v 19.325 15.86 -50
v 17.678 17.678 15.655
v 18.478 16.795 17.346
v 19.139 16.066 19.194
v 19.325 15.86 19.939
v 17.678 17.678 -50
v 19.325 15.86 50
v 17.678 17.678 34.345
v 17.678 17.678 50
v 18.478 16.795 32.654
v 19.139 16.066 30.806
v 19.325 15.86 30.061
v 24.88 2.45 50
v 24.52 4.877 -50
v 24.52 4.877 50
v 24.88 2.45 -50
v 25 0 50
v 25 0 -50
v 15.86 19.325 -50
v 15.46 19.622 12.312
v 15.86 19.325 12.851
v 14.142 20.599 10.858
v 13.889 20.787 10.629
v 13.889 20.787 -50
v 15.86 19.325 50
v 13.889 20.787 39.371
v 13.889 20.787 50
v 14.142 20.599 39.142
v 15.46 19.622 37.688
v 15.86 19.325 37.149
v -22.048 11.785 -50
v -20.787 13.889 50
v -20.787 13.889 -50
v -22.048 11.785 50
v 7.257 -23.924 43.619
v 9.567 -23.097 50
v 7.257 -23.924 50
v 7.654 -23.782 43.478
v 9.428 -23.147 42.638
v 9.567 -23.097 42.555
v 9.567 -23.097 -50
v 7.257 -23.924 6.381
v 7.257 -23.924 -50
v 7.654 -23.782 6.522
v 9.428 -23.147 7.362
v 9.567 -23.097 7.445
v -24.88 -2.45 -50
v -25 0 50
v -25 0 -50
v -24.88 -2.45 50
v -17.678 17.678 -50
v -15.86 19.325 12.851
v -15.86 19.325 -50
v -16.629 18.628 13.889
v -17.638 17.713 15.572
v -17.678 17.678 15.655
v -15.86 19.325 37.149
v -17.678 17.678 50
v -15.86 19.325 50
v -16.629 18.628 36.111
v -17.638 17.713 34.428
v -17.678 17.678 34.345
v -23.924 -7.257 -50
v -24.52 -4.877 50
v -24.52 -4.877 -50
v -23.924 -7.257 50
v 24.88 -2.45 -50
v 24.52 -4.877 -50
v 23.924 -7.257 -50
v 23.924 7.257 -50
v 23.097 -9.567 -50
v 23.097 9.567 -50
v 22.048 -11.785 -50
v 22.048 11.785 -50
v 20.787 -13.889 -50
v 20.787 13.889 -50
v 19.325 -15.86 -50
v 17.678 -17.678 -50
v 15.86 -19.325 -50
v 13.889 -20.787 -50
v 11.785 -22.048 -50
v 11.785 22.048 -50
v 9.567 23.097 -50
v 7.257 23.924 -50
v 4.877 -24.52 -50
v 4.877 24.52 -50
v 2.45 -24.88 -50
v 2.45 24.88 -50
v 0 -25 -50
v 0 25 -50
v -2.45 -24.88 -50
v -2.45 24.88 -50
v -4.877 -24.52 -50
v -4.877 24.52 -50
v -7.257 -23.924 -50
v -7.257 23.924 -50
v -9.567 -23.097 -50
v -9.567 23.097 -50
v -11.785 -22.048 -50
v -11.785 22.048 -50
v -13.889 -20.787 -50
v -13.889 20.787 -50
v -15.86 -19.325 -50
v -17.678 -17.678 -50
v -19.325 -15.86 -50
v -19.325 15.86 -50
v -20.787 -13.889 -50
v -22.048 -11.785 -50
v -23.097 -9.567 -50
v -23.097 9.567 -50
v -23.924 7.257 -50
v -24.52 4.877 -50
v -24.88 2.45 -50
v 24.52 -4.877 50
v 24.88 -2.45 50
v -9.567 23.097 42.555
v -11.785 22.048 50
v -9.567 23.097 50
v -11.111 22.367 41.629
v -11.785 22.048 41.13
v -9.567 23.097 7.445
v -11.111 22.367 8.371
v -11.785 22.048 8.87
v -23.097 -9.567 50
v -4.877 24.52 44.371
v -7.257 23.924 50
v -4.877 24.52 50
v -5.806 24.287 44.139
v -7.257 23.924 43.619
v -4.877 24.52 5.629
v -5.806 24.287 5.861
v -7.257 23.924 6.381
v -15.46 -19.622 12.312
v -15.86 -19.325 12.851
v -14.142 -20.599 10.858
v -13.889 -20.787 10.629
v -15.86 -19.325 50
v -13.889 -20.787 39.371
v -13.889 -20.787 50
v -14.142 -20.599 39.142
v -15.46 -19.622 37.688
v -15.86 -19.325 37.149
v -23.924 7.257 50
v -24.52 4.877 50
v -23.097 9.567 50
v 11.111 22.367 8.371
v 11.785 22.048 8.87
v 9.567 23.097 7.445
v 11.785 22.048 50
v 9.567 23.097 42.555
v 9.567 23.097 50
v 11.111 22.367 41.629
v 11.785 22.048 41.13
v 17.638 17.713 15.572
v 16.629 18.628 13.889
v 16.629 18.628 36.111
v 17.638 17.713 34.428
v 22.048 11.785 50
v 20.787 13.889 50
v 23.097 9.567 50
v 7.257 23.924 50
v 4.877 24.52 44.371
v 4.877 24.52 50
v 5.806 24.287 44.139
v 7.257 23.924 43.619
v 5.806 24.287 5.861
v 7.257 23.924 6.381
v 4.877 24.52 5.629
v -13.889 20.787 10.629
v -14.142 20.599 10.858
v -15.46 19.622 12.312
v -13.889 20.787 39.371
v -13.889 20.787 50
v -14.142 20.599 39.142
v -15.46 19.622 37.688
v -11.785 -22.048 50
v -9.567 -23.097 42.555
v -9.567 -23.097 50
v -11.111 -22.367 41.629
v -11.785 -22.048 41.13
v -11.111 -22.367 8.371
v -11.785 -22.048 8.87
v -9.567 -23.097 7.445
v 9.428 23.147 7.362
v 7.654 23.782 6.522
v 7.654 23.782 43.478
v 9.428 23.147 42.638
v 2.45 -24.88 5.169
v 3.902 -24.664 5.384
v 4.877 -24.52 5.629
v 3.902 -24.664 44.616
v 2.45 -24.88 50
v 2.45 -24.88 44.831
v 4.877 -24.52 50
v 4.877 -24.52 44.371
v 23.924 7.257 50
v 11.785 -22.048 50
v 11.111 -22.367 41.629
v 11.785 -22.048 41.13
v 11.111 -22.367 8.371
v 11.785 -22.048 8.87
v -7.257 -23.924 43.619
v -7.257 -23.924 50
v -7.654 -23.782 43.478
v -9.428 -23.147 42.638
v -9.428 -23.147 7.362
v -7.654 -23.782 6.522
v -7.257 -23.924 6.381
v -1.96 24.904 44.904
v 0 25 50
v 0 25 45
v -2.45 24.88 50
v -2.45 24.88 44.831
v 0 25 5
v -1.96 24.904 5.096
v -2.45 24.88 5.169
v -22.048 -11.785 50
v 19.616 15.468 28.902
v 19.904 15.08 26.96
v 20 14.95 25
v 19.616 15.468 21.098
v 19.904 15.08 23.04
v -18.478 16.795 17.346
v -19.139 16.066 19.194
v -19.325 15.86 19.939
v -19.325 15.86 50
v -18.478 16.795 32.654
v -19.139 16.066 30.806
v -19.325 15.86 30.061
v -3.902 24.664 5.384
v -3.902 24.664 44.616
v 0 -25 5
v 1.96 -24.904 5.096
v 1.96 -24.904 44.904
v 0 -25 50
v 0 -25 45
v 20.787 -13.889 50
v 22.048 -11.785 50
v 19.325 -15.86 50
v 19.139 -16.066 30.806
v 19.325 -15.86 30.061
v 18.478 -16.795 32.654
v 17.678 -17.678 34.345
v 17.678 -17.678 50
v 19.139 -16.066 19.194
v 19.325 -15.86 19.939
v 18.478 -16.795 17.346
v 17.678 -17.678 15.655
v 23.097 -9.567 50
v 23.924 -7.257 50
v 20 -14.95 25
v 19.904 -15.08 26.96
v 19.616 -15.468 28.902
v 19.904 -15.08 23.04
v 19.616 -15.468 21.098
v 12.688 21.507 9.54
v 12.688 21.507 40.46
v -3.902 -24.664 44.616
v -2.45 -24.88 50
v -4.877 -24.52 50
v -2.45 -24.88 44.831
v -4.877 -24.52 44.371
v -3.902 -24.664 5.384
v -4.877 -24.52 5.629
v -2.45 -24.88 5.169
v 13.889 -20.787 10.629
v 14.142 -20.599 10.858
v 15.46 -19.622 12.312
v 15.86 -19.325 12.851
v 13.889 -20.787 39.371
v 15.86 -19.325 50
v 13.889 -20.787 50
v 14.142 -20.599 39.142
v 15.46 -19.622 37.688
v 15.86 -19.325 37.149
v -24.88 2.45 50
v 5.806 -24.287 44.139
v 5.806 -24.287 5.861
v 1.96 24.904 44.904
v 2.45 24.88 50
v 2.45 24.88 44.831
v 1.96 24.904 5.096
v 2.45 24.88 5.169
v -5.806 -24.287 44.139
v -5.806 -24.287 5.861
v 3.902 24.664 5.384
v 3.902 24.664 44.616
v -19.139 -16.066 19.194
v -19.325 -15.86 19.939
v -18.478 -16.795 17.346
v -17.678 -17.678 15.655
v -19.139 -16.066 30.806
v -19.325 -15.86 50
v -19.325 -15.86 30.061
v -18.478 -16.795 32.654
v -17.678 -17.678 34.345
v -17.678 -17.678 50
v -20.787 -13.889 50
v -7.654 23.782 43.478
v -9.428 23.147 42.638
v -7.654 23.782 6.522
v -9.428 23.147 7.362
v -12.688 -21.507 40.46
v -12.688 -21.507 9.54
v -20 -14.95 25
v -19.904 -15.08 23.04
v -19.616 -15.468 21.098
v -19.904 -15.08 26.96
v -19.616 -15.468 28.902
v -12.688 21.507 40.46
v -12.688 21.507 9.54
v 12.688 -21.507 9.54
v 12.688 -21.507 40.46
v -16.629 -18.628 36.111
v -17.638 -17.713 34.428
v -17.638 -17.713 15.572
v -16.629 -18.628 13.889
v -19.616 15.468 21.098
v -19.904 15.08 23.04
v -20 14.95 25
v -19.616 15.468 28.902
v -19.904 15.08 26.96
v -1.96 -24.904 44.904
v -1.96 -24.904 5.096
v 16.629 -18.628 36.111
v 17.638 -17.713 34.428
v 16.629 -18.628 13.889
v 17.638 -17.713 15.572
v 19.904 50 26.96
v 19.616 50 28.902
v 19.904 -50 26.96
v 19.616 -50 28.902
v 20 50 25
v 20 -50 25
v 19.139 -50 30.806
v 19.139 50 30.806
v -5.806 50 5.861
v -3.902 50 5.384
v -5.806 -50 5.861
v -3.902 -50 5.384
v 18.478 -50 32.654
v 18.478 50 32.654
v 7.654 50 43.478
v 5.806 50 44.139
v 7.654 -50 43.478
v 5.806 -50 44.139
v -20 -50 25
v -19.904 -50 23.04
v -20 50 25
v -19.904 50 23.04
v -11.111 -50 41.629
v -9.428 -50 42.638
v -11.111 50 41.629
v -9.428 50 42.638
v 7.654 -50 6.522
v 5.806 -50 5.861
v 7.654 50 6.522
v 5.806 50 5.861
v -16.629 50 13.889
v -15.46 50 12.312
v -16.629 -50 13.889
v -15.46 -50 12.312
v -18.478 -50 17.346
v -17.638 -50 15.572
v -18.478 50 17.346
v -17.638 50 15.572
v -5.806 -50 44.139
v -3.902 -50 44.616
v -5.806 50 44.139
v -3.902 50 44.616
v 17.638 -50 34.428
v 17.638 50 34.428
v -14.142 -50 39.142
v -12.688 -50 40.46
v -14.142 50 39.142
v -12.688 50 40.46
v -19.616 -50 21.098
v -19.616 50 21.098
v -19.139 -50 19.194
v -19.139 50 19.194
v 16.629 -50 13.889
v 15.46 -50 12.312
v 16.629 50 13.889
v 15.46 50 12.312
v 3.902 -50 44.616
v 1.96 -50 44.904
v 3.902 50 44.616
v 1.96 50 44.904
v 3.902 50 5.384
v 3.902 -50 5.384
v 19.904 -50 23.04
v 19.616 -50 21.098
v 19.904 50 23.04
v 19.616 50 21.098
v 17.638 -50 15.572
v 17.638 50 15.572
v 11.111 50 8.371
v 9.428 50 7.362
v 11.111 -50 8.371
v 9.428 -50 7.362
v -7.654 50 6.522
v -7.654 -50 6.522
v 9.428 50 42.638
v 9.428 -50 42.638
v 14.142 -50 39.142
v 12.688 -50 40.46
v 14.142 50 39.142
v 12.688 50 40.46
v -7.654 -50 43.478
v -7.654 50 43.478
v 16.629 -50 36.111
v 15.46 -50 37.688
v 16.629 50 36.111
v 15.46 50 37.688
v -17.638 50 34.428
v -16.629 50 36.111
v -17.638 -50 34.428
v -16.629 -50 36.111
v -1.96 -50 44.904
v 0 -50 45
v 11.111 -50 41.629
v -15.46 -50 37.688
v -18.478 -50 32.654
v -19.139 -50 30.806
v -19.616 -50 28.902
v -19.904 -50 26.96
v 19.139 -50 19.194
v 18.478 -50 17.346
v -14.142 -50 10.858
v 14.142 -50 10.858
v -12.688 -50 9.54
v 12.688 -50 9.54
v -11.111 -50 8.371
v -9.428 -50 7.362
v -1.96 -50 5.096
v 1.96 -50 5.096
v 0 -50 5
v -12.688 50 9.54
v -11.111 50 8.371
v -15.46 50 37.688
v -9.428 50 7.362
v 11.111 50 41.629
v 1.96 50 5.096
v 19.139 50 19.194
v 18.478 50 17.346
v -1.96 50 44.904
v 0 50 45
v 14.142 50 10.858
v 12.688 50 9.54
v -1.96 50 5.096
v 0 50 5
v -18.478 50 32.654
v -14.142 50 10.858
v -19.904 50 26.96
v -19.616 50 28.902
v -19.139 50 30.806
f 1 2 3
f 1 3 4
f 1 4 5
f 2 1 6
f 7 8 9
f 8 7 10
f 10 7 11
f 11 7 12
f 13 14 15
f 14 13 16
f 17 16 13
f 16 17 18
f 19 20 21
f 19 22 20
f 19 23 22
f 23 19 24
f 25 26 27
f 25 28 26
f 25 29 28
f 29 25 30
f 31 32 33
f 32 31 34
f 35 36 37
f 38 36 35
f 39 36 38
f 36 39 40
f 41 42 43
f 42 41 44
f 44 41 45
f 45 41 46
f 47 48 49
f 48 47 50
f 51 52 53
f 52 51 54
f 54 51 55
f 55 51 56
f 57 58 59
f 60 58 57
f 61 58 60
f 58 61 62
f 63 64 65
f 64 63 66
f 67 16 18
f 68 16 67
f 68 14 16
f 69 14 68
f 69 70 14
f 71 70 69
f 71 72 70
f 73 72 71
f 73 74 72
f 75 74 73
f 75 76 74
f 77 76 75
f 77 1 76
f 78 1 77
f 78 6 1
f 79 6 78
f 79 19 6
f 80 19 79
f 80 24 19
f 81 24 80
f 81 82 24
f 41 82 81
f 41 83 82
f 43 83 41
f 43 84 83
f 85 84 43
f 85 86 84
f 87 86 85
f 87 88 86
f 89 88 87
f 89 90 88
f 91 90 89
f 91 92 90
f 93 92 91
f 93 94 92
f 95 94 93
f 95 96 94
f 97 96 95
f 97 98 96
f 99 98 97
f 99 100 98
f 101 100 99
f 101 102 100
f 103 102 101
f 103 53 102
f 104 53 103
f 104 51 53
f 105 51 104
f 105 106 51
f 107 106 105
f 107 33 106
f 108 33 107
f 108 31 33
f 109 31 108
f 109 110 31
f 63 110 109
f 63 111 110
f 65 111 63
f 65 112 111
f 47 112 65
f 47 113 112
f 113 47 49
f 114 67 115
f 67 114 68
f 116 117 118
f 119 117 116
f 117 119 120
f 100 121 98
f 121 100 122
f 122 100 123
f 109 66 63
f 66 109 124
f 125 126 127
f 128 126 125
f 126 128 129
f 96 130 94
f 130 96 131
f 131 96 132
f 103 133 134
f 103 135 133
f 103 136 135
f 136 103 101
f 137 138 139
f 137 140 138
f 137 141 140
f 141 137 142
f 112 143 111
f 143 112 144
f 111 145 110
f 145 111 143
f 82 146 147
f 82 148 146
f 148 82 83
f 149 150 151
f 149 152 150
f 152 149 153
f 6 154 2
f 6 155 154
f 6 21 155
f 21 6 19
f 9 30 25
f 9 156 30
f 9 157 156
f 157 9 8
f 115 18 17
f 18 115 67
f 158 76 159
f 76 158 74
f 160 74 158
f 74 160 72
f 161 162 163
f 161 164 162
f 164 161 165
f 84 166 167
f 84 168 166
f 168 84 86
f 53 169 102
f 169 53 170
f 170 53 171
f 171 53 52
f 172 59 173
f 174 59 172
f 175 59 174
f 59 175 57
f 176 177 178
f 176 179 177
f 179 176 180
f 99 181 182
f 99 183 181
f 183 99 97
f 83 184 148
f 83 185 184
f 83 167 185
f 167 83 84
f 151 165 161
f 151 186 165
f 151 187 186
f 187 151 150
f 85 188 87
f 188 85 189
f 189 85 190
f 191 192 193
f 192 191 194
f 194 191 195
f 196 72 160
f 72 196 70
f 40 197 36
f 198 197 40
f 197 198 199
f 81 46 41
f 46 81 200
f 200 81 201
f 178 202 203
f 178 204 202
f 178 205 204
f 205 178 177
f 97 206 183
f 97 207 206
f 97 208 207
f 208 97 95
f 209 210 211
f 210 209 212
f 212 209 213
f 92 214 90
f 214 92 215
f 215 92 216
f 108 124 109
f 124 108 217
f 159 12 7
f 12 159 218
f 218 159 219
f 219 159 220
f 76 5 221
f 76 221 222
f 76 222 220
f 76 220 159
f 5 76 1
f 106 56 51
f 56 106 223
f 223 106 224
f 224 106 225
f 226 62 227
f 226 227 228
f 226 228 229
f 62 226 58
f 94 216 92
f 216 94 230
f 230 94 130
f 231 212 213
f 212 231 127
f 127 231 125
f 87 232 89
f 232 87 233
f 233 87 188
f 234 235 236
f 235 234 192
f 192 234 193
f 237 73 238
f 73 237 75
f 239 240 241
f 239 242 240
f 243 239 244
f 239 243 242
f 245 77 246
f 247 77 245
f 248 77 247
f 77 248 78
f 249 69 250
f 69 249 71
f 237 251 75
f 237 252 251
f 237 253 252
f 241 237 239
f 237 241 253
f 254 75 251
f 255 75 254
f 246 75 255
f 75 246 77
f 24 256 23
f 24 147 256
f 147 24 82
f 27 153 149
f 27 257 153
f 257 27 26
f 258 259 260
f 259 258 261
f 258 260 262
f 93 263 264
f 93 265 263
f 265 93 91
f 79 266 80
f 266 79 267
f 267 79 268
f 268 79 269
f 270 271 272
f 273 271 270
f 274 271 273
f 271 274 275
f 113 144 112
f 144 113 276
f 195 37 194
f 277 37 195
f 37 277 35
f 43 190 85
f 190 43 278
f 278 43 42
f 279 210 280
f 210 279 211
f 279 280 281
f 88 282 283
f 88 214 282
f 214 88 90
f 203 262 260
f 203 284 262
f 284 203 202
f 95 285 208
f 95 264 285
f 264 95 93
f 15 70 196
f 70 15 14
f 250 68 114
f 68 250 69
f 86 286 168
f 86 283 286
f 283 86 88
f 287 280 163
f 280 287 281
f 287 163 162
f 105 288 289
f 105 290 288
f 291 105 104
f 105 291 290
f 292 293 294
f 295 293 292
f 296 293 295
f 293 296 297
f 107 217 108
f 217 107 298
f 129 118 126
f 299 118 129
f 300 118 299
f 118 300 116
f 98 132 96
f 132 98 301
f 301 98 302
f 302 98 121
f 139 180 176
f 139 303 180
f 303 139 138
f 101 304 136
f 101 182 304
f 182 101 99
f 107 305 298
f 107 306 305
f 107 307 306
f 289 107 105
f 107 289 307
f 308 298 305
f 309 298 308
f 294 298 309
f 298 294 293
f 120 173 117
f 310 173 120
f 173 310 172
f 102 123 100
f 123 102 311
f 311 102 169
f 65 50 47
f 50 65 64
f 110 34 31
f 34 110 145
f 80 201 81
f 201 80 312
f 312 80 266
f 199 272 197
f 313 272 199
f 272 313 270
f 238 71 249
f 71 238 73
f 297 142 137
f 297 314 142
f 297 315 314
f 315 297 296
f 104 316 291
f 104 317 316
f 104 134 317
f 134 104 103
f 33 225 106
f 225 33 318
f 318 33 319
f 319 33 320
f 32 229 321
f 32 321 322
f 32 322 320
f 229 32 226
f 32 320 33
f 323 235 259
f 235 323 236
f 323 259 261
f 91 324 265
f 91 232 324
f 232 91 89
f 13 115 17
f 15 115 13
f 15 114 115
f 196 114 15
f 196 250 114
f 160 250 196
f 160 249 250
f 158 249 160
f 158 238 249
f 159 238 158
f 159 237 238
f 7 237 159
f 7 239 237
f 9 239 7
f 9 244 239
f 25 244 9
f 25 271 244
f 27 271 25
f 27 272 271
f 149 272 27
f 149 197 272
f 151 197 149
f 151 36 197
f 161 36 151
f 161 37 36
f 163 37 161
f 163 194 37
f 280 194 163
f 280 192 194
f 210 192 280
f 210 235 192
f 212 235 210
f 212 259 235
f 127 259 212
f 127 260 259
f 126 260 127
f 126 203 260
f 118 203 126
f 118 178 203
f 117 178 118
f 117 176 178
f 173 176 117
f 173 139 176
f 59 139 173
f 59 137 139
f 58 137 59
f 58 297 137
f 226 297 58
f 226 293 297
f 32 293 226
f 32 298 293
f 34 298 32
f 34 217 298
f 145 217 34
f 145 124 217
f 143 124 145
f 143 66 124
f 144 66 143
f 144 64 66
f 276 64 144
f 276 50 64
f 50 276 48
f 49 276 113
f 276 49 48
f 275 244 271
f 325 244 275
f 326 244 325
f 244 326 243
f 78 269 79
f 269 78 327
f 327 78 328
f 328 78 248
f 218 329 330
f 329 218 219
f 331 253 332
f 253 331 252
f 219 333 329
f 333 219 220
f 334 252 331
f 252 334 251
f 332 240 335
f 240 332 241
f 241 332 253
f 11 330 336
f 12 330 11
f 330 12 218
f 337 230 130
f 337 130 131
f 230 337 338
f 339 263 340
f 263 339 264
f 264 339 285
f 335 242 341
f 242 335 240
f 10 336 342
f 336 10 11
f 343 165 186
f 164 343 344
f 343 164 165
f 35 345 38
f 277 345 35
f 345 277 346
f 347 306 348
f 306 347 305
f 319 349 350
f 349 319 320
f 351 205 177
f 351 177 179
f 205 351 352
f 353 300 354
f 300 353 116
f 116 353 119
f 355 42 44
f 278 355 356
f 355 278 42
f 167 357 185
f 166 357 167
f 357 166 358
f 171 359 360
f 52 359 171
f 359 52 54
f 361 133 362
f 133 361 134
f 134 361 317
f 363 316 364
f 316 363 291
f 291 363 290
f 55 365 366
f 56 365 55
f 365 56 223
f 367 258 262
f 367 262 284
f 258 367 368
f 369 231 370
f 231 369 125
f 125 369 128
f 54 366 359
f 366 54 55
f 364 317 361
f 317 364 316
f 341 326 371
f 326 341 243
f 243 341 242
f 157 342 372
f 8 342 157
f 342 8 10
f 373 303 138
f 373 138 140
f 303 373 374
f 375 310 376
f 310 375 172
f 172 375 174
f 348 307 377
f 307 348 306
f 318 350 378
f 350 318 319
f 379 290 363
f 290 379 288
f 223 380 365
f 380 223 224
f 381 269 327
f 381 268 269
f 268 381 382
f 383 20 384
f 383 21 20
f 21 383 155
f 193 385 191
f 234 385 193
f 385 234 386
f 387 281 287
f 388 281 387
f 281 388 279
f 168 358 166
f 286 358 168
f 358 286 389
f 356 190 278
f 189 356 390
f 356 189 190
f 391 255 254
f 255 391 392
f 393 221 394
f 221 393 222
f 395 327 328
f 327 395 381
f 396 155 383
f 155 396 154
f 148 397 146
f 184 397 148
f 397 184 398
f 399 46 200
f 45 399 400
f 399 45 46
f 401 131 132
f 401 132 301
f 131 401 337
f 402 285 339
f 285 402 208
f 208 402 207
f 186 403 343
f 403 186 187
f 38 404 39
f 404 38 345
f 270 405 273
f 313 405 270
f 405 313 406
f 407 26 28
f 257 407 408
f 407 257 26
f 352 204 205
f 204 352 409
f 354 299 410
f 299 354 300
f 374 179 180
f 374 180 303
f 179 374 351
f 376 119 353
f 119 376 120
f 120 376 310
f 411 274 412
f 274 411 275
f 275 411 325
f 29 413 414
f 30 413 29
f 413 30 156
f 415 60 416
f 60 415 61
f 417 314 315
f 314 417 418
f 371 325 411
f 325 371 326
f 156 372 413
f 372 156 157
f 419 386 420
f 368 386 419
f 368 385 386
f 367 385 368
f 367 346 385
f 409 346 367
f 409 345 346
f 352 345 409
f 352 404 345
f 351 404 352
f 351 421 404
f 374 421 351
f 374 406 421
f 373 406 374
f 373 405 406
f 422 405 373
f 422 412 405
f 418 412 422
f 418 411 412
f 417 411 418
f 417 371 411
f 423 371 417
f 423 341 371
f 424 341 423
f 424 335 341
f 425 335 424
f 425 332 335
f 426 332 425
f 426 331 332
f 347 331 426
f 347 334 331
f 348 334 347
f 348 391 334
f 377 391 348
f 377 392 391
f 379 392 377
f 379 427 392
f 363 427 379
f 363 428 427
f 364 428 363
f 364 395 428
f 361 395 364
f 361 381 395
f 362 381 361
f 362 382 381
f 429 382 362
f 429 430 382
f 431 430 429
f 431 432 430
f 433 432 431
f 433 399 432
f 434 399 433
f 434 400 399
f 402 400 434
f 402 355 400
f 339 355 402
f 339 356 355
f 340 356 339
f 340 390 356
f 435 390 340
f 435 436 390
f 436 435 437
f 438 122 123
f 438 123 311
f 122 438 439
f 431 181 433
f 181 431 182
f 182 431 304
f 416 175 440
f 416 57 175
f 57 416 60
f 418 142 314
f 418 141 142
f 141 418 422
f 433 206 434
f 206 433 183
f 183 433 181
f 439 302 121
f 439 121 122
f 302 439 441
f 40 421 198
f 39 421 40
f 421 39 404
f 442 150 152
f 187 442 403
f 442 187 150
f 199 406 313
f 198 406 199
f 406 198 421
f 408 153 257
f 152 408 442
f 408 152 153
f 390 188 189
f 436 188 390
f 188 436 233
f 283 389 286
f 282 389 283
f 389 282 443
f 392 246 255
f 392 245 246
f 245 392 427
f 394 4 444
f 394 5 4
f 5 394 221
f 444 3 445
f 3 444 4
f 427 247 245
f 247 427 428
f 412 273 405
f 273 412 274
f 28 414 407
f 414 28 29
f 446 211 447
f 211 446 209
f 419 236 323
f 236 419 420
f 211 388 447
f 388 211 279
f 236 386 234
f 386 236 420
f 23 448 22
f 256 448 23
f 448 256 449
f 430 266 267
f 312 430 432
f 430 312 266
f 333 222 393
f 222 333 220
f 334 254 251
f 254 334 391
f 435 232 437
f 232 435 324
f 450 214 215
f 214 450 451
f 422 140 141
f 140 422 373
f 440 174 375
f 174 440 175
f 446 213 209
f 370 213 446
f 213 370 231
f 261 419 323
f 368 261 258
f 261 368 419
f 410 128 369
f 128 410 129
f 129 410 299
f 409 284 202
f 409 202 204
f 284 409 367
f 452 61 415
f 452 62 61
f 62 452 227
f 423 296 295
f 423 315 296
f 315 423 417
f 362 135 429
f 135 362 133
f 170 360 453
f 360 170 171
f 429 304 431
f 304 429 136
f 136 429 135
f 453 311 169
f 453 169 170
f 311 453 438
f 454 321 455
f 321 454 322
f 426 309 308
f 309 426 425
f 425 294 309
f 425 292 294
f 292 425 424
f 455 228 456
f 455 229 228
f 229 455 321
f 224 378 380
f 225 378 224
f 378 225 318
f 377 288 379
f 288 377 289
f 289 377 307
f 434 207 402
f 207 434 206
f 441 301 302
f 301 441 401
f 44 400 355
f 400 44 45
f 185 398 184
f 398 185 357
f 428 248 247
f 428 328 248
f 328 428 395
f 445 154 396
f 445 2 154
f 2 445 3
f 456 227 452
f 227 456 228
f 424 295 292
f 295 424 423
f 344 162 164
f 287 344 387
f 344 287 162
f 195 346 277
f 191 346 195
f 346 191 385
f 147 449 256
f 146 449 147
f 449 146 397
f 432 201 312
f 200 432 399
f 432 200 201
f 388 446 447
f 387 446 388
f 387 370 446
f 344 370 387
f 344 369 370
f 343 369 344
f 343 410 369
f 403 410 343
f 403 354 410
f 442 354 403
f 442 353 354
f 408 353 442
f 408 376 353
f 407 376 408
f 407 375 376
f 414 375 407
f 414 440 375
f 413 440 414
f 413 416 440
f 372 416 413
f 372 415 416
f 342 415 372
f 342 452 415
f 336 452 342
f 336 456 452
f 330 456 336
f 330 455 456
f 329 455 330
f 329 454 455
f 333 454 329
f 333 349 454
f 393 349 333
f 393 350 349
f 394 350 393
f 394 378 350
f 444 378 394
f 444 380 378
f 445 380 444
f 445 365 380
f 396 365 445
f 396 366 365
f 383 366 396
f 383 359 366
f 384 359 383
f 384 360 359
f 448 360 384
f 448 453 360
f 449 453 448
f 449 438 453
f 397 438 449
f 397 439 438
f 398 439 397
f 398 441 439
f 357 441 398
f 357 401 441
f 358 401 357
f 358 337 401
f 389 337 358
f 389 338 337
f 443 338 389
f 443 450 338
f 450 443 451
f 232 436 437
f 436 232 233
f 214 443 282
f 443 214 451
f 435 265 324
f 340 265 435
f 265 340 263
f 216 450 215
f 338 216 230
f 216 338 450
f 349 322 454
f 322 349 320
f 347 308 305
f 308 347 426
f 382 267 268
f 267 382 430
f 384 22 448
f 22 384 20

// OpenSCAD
module ht_pipe() {
    $fn = 64;
    // Main vertical pipe
    cylinder(h = 100, r1 = 25, r2 = 25, center = true);
    
    // Horizontal pipe
    translate([0, 0, 25])
    rotate([90, 0, 0])
    cylinder(h = 100, r1 = 20, r2 = 20, center = true);
}

ht_pipe();
